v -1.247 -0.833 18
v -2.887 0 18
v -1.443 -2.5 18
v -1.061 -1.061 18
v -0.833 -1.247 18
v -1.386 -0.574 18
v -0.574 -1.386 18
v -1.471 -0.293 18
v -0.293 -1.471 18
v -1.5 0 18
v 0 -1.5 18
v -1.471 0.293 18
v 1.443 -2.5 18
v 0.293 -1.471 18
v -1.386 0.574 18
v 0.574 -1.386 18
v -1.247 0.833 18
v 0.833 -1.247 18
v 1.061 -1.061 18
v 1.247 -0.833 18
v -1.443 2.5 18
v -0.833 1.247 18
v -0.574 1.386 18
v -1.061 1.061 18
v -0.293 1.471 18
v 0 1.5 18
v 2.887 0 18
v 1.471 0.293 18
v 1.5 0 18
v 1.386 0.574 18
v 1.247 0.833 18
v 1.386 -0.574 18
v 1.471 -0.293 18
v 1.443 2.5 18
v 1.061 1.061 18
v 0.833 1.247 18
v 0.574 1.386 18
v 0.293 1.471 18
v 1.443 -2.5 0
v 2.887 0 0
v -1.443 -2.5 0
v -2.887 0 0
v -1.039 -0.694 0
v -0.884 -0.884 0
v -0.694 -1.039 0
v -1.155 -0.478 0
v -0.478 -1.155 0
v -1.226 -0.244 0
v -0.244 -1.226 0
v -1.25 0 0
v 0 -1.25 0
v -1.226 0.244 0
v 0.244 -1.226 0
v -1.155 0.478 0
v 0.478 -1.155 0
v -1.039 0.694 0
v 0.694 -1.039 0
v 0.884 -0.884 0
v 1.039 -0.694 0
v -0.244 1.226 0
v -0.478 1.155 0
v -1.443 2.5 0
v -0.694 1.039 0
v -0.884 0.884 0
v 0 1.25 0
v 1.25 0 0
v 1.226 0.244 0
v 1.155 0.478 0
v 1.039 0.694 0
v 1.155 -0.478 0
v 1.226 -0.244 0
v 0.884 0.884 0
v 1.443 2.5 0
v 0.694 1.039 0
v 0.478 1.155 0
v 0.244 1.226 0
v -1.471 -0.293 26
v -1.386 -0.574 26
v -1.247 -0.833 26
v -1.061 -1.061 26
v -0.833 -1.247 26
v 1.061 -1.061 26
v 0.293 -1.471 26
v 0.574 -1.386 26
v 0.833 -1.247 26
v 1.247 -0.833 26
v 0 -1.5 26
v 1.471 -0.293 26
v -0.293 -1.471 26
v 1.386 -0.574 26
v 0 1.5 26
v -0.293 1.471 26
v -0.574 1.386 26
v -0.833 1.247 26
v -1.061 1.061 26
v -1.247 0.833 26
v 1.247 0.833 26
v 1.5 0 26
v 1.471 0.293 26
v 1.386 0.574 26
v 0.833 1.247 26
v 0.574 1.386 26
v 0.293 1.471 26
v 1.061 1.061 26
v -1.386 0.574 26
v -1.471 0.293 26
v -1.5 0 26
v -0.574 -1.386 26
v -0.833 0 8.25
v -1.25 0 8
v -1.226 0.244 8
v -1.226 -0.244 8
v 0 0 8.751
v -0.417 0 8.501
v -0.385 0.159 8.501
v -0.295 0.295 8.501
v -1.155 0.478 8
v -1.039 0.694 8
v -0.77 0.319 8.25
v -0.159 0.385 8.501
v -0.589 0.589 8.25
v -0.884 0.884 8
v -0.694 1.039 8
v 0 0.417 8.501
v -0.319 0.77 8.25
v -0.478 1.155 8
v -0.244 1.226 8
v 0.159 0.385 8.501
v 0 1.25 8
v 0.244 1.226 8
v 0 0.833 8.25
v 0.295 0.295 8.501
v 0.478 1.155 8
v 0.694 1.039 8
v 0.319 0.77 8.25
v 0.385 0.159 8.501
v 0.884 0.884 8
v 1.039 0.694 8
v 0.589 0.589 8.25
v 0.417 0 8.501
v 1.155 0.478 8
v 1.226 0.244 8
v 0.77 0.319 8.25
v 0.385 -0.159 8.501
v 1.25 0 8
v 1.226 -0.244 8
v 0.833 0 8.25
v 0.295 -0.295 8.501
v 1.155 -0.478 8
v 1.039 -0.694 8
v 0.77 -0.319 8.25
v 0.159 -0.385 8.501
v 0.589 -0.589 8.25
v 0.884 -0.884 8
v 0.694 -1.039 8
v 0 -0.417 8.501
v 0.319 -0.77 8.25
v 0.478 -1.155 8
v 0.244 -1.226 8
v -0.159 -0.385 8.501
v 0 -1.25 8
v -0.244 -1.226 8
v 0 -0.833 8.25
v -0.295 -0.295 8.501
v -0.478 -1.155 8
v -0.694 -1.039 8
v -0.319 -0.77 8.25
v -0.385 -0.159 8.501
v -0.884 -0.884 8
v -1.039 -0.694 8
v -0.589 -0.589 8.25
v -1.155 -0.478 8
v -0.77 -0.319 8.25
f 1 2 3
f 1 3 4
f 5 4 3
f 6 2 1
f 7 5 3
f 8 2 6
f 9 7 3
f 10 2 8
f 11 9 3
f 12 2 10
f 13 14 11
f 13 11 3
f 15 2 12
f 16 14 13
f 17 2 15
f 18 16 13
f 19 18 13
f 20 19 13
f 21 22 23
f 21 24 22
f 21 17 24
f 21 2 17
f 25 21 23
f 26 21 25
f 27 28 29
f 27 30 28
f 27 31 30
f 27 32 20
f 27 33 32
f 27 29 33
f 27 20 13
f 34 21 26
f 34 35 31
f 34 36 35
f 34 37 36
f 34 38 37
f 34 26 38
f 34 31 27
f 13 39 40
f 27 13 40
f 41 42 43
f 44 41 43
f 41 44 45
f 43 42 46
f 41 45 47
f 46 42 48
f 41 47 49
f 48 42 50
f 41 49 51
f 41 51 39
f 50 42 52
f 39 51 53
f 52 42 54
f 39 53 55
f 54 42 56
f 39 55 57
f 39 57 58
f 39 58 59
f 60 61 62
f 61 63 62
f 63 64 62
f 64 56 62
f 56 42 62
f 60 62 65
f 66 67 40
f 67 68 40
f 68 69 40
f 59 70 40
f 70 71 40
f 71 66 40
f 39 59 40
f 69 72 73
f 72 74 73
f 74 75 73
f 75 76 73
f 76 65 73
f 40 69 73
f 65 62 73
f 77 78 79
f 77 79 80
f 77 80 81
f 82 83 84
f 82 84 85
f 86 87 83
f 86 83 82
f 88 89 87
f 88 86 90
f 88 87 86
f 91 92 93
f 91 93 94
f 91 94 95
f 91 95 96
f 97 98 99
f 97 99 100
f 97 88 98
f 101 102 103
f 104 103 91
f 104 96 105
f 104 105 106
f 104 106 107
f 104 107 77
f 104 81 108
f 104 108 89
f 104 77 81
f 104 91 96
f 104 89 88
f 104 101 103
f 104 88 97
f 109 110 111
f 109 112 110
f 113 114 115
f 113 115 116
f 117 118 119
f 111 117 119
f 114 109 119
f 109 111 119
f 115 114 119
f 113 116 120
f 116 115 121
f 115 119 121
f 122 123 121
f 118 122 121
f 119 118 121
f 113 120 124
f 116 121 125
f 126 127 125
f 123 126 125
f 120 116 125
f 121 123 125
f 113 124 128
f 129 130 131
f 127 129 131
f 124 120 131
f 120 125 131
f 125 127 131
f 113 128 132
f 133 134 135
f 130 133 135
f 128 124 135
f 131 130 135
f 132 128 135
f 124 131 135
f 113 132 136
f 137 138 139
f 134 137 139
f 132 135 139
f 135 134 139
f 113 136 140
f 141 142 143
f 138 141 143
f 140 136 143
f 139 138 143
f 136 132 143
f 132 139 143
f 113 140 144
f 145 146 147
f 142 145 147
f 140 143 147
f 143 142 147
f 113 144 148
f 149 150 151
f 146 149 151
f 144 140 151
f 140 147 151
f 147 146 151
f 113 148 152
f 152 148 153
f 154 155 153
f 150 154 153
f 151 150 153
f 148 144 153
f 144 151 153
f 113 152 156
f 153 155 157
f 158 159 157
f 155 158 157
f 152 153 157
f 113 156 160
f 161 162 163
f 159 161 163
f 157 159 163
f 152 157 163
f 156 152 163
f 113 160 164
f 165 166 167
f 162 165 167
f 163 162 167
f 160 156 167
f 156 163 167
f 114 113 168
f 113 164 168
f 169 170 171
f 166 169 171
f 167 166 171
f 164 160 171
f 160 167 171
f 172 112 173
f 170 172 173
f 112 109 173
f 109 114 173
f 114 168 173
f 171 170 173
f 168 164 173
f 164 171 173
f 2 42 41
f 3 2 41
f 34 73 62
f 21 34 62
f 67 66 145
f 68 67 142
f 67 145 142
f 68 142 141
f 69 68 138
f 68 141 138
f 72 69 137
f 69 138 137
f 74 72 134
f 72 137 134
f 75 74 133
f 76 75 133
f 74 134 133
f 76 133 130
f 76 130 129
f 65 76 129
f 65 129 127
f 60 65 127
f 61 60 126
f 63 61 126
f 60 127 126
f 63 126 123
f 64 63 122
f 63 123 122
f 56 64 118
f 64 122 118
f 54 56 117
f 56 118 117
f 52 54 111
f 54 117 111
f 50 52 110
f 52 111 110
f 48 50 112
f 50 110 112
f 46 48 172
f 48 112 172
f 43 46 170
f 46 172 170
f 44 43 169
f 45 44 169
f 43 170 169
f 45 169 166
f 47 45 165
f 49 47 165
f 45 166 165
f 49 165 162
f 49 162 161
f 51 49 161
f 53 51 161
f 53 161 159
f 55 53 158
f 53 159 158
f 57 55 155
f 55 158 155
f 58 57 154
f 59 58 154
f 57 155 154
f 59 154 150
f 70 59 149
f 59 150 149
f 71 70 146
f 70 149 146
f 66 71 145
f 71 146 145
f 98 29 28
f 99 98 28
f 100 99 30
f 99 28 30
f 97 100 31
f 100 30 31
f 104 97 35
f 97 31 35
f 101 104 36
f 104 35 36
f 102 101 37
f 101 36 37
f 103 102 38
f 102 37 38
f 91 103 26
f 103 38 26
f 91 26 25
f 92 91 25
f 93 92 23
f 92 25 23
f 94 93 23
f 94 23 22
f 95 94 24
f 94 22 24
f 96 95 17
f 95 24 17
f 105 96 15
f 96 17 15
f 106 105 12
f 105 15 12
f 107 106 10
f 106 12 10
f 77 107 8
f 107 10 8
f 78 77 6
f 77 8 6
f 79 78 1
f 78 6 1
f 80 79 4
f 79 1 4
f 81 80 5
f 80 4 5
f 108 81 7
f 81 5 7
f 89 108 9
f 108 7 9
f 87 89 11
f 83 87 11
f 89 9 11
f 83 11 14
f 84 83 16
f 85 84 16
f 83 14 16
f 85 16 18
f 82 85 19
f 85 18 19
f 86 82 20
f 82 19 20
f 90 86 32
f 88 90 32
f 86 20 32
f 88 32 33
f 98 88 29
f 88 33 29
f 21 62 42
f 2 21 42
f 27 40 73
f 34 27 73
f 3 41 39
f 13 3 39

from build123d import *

# Parameters (mm, degrees)
BOSS_EXTRUDE1_DEPTH       = 18
SKETCH2_R                 = 1.5
BOSS_EXTRUDE2_DEPTH       = 8
M3X0_5_TAPPED_HOLE1_D     = 2.5
M3X0_5_TAPPED_HOLE1_DEPTH = 8
M3X0_5_TAPPED_HOLE1_TIP   = 0.751075774


with BuildPart() as part:
    # Sketch1 → Boss-Extrude1 (new body)
    with BuildSketch(Plane.XY):
        Polygon((-1.443375673, 2.5), (-2.886751346, 0), (-1.443375673, -2.5), (1.443375673, -2.5), (2.886751346, 0), (1.443375673, 2.5), align=None)
    extrude(amount=BOSS_EXTRUDE1_DEPTH)

    # Sketch2 → Boss-Extrude2 (add)
    with BuildSketch(Plane.XY.offset(18)):
        Circle(SKETCH2_R)
    extrude(amount=BOSS_EXTRUDE2_DEPTH)

    # M3x0.5 Tapped Hole1
    with Locations(Plane(origin=(0, 0, 0), x_dir=(-1, 0, 0), z_dir=(0, 0, -1))):
        with Locations((0, 0)):
            Hole(M3X0_5_TAPPED_HOLE1_D / 2, depth=M3X0_5_TAPPED_HOLE1_DEPTH)
            with Locations((0, 0, -(M3X0_5_TAPPED_HOLE1_DEPTH + M3X0_5_TAPPED_HOLE1_TIP / 2))):  # 118° drill point
                Cone(0, M3X0_5_TAPPED_HOLE1_D / 2, M3X0_5_TAPPED_HOLE1_TIP, mode=Mode.SUBTRACT)


solid = part.part
